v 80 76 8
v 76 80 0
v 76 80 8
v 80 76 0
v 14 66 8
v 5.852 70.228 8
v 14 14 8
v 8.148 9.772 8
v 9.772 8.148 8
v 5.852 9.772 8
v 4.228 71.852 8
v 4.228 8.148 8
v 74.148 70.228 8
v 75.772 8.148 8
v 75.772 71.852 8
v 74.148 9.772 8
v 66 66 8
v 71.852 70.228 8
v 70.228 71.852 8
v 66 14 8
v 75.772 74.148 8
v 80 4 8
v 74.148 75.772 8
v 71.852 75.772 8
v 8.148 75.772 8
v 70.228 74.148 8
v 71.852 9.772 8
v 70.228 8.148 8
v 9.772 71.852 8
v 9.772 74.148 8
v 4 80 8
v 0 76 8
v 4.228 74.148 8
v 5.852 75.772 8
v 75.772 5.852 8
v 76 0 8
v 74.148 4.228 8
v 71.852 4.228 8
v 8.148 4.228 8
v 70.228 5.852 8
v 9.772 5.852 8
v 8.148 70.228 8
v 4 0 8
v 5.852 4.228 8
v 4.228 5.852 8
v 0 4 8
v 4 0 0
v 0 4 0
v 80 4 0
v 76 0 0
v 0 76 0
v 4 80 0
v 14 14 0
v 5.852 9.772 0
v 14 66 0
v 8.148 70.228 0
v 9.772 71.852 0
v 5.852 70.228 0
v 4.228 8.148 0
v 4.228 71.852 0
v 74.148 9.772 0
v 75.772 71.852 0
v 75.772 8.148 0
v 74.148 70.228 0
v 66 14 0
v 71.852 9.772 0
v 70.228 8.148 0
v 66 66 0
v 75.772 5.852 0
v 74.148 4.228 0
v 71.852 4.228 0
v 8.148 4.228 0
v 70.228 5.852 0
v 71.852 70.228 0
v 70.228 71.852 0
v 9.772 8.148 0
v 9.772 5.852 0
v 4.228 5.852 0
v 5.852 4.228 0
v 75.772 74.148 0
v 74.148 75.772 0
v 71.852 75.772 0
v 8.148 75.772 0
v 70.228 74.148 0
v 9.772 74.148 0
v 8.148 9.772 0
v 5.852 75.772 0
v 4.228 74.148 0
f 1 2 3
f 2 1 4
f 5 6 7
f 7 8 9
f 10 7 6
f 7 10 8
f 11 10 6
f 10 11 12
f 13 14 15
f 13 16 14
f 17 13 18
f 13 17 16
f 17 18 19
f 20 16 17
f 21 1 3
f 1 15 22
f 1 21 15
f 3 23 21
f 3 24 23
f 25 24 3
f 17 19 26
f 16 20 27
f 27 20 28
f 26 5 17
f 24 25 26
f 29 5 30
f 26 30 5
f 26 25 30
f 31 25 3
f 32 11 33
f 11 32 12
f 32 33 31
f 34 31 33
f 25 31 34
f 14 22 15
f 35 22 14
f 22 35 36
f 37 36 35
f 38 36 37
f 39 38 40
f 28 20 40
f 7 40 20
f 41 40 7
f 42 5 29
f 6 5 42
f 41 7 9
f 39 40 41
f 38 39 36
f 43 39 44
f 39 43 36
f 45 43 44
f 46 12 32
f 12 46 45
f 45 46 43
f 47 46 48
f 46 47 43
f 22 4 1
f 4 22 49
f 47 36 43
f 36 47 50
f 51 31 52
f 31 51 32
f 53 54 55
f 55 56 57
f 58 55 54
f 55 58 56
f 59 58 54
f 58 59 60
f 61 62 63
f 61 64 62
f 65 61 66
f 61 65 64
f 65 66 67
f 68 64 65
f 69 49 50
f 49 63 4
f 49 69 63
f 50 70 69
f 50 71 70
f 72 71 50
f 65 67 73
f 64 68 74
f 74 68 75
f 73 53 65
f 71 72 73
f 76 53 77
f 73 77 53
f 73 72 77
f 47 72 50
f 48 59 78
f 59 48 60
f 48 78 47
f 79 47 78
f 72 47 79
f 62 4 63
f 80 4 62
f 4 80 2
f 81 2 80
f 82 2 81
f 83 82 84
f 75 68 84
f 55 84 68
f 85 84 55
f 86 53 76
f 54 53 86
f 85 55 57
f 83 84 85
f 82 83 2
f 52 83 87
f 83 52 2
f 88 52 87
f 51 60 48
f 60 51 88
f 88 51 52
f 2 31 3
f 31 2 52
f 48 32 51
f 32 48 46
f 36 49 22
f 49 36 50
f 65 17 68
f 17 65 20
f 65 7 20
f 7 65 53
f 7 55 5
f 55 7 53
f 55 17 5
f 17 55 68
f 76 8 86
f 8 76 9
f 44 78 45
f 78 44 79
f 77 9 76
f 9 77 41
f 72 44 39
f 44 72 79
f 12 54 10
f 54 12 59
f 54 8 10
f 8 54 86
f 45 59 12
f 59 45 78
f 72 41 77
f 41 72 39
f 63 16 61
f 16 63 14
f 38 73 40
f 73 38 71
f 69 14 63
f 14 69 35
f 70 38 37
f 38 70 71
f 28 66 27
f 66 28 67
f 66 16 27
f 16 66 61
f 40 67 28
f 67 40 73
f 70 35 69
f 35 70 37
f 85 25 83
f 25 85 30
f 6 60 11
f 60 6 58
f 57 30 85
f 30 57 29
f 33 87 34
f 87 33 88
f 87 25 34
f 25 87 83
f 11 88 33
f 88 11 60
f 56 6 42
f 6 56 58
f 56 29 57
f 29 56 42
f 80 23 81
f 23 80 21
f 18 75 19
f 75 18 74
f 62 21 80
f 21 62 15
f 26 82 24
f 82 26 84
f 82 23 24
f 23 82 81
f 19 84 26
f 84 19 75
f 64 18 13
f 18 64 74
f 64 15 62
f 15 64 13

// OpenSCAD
$fn = 32;

// ----------------------------------------------------------------------
// Frame plate: 80 x 80 frame, 14 mm rails
// ----------------------------------------------------------------------

// --- parameters (mm) ---
plate_l = 80;             // plate length, X
plate_w = 80;             // plate width, Y
plate_t = 8;              // plate thickness, Z (extrusion height)
corner_c = 4;             // corner chamfer
frame_bar = 14;           // frame rail width
bolt_r = 3;               // corner bolt window radius
bolt_inset = 7;           // bolt centre inset from the edges

win_l = plate_l - 2 * frame_bar;  // window length
win_w = plate_w - 2 * frame_bar;  // window width
bolt_d = 2 * bolt_r;  // corner hole diameter

profile = [[4, 0], [76, 0], [80, 4], [80, 76], [76, 80], [4, 80], [0, 76], [0, 4]];  // primary outline, 8 points, counter clockwise
void_1 = [[14, 14], [66, 14], [66, 66], [14, 66]];  // the window, 4 points
void_2 = [[9.772, 8.148], [8.148, 9.772], [5.852, 9.772], [4.228, 8.148], [4.228, 5.852], [5.852, 4.228], [8.148, 4.228], [9.772, 5.852]];  // corner bolt window, 8 points
void_3 = [[75.772, 8.148], [74.148, 9.772], [71.852, 9.772], [70.228, 8.148], [70.228, 5.852], [71.852, 4.228], [74.148, 4.228], [75.772, 5.852]];  // corner bolt window, 8 points
void_4 = [[9.772, 74.148], [8.148, 75.772], [5.852, 75.772], [4.228, 74.148], [4.228, 71.852], [5.852, 70.228], [8.148, 70.228], [9.772, 71.852]];  // corner bolt window, 8 points
void_5 = [[75.772, 74.148], [74.148, 75.772], [71.852, 75.772], [70.228, 74.148], [70.228, 71.852], [71.852, 70.228], [74.148, 70.228], [75.772, 71.852]];  // corner bolt window, 8 points

// --- the one profile operation ---
difference() {
  linear_extrude(height = plate_t) polygon(points = profile);
  translate([0, 0, -1])
    linear_extrude(height = plate_t + 2) polygon(points = void_1);
  translate([0, 0, -1])
    linear_extrude(height = plate_t + 2) polygon(points = void_2);
  translate([0, 0, -1])
    linear_extrude(height = plate_t + 2) polygon(points = void_3);
  translate([0, 0, -1])
    linear_extrude(height = plate_t + 2) polygon(points = void_4);
  translate([0, 0, -1])
    linear_extrude(height = plate_t + 2) polygon(points = void_5);
}
